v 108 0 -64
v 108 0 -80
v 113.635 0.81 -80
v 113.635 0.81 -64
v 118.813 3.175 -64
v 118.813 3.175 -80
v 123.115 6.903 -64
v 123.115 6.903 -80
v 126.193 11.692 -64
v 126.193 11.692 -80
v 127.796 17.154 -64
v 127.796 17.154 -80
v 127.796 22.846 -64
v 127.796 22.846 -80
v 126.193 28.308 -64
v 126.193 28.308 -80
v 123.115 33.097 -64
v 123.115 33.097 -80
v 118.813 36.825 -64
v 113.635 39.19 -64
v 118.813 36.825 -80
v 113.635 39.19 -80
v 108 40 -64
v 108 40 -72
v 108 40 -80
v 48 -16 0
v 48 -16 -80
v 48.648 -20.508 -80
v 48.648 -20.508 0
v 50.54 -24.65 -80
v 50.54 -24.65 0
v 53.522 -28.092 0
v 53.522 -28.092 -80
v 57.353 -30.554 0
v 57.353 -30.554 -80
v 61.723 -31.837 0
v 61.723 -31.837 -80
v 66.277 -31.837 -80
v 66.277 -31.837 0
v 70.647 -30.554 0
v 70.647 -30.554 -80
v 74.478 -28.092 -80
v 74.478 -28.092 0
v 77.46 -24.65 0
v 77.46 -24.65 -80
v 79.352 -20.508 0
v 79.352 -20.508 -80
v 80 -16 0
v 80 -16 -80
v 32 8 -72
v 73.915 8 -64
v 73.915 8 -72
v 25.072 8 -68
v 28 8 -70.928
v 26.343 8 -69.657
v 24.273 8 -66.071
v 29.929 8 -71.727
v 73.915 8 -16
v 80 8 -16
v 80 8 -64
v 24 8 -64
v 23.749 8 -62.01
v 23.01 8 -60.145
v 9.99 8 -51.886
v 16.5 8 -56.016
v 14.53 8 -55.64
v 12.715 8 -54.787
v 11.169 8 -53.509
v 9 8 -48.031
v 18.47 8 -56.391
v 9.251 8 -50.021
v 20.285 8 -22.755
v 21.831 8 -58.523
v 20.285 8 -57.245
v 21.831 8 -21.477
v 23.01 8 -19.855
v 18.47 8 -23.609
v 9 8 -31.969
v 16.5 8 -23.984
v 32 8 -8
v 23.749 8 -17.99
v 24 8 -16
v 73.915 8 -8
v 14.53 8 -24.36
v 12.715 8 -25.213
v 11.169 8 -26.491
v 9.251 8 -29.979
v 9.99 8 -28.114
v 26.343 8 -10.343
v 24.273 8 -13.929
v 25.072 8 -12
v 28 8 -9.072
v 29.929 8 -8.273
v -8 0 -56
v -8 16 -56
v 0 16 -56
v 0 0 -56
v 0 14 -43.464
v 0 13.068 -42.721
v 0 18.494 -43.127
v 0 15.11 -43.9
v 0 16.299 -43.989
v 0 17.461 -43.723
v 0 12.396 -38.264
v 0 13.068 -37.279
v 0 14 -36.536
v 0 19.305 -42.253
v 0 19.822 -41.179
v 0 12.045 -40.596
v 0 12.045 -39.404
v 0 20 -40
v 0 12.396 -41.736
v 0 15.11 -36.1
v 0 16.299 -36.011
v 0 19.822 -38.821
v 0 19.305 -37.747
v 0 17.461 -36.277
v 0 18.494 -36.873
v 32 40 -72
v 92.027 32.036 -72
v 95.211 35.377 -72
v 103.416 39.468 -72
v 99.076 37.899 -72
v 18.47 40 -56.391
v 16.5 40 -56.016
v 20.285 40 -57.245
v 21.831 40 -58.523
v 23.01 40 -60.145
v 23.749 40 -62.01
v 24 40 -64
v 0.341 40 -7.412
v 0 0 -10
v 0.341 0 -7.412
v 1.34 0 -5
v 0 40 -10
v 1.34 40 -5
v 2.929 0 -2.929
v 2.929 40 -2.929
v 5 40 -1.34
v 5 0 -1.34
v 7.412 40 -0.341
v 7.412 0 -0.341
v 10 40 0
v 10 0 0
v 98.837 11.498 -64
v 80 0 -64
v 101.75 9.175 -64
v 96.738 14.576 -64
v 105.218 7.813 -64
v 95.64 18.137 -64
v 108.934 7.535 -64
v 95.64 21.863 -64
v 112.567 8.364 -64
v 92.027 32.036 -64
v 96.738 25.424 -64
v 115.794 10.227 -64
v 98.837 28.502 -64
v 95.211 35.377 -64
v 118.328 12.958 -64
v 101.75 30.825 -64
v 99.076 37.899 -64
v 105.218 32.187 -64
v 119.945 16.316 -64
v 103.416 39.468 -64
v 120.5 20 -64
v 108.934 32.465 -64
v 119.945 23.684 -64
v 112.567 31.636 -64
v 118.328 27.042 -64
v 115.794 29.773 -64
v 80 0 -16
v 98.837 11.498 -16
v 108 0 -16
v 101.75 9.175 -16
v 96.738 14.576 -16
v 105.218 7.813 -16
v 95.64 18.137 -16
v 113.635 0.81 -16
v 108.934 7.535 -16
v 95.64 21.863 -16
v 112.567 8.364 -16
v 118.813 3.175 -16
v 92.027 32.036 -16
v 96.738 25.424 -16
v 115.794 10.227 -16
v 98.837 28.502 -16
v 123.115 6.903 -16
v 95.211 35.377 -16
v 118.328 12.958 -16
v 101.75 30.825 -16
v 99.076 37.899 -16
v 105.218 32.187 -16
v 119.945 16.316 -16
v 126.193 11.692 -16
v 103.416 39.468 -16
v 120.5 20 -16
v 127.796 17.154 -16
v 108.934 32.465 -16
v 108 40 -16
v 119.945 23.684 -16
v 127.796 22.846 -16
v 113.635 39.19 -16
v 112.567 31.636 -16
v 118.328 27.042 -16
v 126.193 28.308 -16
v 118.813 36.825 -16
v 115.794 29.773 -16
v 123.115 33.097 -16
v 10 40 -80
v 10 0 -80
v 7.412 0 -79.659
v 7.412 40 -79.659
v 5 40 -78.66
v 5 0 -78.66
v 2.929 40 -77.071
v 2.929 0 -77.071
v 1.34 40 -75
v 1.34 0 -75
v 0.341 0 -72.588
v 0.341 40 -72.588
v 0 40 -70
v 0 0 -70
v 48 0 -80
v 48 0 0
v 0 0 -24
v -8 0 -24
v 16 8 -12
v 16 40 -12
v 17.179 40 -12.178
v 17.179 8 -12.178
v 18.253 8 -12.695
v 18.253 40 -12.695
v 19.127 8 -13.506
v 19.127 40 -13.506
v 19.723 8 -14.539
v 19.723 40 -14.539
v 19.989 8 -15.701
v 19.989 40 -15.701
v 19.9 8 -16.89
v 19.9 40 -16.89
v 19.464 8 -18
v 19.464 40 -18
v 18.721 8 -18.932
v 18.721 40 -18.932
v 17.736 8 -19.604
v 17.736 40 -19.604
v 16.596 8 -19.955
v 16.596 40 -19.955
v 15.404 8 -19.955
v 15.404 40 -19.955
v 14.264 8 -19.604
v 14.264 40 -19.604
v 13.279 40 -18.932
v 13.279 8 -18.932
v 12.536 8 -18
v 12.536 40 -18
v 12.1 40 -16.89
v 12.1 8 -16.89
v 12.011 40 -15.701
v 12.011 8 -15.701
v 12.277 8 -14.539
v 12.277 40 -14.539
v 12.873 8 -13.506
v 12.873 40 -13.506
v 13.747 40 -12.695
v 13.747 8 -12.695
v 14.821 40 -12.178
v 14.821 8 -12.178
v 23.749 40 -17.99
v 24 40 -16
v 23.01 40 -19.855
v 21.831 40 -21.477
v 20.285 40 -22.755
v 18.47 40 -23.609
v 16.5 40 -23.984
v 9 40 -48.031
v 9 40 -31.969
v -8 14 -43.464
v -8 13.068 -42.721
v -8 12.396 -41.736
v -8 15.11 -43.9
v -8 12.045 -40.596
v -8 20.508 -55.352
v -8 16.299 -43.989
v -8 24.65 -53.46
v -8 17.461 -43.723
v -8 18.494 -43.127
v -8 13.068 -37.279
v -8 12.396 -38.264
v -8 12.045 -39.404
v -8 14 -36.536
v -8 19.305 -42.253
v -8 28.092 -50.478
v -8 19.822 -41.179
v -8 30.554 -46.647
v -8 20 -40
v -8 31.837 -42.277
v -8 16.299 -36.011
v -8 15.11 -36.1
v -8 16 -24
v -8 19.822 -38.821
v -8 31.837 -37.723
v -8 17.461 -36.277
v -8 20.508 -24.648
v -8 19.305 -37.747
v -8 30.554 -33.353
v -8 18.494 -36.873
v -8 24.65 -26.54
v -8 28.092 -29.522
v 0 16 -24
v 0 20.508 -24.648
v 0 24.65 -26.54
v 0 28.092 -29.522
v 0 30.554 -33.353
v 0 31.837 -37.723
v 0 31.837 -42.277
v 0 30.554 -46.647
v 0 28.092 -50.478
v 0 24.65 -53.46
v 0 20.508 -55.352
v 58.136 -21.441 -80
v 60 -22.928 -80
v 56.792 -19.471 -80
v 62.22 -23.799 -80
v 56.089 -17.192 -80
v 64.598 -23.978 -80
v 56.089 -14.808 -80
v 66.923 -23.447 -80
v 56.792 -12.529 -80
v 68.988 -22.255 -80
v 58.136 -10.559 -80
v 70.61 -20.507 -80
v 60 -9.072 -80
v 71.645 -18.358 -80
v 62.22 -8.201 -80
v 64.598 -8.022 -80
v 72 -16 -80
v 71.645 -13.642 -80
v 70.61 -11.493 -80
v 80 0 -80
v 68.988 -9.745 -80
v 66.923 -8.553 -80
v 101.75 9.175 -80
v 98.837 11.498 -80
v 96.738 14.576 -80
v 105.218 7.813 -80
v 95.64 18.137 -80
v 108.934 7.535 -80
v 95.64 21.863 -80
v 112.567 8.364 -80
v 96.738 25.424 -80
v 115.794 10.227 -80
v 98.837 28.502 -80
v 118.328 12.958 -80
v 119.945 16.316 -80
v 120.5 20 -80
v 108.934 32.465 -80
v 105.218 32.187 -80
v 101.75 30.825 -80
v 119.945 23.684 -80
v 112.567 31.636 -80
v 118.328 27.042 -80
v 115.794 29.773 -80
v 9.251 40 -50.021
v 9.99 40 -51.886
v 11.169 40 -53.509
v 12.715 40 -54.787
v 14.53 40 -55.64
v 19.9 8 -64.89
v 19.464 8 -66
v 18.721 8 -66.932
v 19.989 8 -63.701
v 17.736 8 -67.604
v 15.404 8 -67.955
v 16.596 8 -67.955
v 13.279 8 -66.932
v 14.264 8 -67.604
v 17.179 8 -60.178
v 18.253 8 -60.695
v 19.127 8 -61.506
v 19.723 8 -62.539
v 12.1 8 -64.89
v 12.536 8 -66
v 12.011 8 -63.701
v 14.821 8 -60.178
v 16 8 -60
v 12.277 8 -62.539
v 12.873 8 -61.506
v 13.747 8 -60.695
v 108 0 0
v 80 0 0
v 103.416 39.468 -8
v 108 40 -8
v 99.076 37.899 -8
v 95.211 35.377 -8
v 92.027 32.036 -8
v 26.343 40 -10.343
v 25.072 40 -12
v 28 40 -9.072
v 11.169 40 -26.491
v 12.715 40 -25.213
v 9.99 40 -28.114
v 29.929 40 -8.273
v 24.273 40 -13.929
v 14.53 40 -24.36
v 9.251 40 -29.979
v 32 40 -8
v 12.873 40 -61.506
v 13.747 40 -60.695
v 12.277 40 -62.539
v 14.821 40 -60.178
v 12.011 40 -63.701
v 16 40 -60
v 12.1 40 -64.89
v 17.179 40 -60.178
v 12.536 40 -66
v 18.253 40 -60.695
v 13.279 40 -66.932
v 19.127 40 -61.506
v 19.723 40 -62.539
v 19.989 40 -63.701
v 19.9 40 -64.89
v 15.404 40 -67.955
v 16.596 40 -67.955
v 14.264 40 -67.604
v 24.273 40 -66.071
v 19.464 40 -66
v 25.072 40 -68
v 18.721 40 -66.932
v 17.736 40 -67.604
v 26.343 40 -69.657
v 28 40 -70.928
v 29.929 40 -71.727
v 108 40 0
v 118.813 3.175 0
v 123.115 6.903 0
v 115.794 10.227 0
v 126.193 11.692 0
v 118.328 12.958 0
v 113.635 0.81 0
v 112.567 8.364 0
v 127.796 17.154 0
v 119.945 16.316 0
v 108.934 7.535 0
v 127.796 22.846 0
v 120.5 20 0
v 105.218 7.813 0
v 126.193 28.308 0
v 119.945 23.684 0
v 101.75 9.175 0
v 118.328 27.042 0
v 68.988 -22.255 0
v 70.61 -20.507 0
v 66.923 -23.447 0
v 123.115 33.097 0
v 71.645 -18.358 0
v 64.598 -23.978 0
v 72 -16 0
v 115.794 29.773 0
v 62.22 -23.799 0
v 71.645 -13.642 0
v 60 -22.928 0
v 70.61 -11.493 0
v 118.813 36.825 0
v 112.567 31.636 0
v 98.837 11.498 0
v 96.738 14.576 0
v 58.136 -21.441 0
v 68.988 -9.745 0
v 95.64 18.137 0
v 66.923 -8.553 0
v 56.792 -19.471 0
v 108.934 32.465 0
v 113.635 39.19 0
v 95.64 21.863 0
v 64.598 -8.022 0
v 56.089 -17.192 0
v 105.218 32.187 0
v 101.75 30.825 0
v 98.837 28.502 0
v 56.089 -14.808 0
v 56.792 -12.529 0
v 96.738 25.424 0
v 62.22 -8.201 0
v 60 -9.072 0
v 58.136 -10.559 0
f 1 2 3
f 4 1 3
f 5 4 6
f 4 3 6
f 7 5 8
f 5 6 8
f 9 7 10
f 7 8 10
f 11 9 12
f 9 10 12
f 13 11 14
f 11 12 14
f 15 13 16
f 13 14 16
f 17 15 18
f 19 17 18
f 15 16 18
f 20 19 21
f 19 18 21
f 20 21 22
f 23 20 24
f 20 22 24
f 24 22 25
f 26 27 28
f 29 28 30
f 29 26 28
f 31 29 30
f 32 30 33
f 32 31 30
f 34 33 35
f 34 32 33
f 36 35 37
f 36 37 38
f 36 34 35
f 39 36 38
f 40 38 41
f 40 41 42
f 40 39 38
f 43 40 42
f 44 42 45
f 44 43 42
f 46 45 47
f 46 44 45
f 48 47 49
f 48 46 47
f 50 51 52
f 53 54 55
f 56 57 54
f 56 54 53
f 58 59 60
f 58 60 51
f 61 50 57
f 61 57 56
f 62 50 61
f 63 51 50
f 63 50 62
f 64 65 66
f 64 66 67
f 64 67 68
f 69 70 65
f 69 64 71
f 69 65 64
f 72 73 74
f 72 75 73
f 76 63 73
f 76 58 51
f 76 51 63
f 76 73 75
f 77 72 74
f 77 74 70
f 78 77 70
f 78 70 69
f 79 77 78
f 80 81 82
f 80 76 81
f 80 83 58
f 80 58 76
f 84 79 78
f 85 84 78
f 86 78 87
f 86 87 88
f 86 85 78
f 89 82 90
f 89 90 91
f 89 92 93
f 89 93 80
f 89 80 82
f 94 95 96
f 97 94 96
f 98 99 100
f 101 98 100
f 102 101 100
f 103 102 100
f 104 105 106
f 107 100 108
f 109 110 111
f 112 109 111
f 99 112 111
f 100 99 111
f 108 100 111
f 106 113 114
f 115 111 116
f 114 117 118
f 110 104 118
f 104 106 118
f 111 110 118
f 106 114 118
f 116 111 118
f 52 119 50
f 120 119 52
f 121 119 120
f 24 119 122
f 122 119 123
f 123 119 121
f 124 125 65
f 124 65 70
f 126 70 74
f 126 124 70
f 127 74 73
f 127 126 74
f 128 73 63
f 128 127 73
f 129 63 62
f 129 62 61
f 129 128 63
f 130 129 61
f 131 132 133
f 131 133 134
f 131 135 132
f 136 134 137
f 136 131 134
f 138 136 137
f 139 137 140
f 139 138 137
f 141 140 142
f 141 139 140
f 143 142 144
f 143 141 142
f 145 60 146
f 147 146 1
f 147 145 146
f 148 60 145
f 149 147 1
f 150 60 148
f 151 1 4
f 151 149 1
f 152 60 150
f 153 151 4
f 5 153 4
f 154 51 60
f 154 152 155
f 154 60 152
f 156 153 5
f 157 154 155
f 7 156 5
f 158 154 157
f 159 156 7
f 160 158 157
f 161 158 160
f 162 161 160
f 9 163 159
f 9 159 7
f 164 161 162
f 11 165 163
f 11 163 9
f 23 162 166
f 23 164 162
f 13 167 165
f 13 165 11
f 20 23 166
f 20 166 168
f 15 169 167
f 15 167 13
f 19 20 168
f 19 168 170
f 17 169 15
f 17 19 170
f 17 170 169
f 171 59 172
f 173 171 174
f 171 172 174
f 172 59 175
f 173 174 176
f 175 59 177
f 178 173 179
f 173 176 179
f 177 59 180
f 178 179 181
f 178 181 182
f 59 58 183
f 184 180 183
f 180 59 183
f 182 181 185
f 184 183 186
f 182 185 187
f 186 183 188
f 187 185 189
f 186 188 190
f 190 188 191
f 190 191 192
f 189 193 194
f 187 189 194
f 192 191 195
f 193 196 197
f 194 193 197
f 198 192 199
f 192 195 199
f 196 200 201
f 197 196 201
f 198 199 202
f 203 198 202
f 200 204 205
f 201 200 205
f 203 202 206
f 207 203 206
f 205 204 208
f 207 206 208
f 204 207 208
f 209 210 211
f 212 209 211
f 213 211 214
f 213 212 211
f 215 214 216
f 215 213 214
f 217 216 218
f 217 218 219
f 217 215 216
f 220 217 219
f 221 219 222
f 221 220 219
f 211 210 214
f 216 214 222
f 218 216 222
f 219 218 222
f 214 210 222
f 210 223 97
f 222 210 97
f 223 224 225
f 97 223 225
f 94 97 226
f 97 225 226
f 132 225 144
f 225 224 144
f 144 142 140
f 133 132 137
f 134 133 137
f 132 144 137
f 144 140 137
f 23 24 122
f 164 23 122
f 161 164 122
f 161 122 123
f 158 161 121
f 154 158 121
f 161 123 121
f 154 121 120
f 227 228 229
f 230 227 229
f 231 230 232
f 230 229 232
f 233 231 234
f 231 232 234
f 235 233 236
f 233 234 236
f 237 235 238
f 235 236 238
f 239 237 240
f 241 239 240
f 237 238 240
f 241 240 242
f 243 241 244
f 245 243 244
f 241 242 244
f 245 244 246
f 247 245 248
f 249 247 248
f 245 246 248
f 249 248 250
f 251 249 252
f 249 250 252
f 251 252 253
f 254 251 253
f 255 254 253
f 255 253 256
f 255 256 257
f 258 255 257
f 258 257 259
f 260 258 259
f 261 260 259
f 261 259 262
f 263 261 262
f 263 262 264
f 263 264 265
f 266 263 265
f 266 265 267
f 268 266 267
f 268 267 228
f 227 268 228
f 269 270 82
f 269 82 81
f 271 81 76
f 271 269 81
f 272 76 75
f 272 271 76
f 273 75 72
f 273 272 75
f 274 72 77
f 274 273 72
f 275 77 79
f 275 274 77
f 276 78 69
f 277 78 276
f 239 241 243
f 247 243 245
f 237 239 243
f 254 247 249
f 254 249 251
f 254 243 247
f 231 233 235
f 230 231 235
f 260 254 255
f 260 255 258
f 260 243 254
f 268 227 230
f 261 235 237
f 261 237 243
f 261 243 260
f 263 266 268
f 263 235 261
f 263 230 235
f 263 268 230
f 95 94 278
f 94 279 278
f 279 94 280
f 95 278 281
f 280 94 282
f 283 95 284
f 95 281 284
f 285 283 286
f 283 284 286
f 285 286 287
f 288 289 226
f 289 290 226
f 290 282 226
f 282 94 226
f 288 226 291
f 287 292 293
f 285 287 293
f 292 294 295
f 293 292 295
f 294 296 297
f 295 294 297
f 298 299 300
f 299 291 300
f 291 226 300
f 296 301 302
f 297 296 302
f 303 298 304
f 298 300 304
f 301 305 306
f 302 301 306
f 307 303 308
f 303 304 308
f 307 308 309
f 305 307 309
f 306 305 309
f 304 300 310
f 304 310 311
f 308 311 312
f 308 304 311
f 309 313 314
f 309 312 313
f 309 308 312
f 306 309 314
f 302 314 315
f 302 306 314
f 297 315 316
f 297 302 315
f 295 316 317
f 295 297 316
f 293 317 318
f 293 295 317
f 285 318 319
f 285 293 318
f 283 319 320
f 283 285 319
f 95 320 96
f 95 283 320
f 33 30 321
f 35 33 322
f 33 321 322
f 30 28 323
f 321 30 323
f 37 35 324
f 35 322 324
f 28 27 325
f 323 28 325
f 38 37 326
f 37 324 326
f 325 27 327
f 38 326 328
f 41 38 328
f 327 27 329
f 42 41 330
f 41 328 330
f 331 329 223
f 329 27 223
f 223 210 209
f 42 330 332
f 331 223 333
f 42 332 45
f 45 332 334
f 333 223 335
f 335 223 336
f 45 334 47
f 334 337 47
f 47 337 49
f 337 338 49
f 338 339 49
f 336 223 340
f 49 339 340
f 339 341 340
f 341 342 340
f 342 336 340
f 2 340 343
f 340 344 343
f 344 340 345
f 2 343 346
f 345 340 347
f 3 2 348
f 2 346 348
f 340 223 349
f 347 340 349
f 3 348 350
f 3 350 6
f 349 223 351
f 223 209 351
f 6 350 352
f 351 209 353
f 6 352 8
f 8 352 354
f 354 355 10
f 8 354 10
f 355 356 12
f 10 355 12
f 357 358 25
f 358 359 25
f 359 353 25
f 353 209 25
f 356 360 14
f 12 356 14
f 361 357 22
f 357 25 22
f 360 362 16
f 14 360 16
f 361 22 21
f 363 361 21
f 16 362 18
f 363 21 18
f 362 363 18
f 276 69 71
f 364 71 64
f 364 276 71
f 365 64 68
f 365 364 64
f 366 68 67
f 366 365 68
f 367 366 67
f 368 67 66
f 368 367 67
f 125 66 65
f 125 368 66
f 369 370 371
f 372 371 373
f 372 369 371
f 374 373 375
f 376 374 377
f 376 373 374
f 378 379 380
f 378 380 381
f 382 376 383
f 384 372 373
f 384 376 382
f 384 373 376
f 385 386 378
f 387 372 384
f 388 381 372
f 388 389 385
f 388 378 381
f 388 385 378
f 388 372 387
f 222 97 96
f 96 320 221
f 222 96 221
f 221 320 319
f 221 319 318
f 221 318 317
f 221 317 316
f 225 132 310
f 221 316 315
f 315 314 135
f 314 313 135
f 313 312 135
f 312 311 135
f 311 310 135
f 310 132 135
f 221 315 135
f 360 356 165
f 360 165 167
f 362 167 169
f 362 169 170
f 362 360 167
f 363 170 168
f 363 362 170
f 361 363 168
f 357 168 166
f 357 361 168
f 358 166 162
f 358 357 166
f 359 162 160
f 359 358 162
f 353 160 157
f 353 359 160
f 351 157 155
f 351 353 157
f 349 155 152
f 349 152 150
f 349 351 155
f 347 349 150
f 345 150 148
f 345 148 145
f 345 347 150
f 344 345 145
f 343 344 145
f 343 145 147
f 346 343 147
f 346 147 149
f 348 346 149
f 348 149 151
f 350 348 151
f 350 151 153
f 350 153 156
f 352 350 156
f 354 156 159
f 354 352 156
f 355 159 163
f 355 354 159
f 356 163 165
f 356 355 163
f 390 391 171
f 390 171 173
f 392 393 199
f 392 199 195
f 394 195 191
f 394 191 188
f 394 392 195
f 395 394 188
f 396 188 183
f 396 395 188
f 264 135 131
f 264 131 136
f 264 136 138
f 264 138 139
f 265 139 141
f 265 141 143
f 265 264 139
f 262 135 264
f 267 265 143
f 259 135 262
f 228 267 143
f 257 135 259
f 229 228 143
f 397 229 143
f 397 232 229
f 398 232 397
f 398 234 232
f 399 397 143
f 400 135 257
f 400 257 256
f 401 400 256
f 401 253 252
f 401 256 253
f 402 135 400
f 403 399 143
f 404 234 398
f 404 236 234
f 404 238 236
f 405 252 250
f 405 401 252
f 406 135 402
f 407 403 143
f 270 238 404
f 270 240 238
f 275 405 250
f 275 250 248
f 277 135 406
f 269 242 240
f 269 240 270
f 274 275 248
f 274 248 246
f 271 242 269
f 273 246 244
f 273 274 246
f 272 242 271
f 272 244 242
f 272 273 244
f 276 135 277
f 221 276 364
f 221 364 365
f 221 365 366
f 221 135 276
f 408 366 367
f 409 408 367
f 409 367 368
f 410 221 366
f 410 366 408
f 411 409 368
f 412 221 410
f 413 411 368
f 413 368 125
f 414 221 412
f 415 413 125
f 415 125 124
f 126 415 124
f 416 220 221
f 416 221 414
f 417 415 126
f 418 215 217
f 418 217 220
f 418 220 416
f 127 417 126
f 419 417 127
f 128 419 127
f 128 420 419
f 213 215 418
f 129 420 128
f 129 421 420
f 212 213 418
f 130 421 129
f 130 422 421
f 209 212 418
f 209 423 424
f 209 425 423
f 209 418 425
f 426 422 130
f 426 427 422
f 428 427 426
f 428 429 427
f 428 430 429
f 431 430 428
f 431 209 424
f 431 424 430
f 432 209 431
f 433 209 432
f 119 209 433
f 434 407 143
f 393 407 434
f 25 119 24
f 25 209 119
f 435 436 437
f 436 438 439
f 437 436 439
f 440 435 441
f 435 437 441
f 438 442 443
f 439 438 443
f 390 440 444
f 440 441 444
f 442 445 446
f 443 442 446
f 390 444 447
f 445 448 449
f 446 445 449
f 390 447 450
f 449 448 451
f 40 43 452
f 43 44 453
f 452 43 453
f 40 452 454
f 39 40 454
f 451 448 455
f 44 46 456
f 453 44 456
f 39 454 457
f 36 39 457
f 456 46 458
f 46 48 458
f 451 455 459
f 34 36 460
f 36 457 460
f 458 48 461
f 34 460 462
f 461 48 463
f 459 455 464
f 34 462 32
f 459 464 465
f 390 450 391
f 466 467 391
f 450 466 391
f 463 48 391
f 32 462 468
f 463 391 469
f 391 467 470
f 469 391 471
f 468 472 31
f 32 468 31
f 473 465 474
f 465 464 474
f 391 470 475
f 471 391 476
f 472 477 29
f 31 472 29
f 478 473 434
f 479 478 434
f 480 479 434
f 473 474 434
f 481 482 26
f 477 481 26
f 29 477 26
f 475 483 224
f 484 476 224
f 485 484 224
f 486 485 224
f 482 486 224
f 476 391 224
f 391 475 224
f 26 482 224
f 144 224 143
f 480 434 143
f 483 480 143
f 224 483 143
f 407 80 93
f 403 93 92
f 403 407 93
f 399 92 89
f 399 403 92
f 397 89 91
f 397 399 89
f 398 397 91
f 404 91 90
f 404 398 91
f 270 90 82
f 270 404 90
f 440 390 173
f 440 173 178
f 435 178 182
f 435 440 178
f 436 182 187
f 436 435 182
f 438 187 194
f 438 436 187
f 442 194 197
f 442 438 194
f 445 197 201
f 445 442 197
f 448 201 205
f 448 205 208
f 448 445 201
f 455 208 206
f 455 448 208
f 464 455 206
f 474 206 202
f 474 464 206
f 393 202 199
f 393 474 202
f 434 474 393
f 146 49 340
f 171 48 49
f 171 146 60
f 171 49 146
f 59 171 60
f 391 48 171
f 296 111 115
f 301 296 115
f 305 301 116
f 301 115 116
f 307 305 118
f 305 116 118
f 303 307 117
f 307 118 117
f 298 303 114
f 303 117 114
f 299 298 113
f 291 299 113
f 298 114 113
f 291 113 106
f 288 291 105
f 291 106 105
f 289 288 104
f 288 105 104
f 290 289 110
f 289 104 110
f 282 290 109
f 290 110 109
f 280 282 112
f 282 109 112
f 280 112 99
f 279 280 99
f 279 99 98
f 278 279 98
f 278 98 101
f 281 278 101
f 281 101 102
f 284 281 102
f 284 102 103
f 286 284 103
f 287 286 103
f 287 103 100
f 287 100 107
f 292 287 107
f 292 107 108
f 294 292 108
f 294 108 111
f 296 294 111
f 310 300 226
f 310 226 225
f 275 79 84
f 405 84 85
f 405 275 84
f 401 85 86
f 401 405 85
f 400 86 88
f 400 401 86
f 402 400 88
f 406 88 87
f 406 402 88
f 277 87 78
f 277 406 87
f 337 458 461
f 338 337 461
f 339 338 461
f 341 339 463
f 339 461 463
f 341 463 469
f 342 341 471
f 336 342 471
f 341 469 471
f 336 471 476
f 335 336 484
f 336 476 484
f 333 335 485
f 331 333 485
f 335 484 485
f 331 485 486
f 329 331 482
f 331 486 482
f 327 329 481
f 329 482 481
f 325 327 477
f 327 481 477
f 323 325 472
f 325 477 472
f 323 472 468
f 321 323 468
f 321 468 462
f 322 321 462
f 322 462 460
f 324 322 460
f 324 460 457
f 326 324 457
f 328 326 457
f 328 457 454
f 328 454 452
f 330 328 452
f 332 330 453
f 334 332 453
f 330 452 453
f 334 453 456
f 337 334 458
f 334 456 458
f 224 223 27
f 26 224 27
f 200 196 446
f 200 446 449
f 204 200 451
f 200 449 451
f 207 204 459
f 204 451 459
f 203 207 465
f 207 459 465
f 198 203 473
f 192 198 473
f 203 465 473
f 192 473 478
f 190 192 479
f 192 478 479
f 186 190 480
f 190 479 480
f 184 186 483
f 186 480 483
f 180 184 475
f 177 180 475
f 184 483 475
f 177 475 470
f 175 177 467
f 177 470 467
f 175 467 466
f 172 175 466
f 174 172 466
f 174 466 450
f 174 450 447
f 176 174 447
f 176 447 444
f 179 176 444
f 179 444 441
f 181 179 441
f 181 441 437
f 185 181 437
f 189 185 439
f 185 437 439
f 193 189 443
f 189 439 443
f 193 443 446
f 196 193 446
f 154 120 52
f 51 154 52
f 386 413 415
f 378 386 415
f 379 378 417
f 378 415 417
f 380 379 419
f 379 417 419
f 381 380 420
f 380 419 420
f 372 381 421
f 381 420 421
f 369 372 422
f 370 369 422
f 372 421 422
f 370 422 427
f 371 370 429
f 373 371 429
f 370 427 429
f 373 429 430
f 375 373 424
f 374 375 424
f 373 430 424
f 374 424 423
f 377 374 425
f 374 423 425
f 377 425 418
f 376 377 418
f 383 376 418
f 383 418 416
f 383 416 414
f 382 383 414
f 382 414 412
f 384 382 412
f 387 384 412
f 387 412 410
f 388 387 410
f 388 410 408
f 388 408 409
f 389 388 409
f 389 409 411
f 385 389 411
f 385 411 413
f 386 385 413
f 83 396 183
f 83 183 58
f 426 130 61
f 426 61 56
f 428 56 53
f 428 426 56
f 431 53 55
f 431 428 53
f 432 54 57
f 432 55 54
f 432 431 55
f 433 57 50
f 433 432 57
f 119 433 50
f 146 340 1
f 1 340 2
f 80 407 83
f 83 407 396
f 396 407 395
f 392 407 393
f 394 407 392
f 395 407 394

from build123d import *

# Parameters (mm, degrees)
SKETCH1_R                 = 12.5
BOSS_EXTRUDE1_DEPTH       = 16
BOSS_EXTRUDE2_DEPTH       = 8
SKETCH1_6_R               = 8
BOSS_EXTRUDE3_DEPTH       = 80
BOSS_EXTRUDE4_START       = -24
SKETCH1_7_W               = 8
SKETCH1_7_H               = 32
BOSS_EXTRUDE4_DEPTH       = 32
FILLET1_RADIUS            = 16
FILLET1_LENGTH            = 8
F_8_0MM_DOWEL_HOLE1_D     = 8
F_8_0MM_DOWEL_HOLE1_DEPTH = 8
BOSS_EXTRUDE5_REACH       = 169.236
SKETCH3_R                 = 4
FILLET2_R                 = 10


with BuildPart() as part:
    # Sketch1 → Boss-Extrude1 (new body)
    with BuildSketch(Plane.XY):
        with BuildLine():
            Line((80, 8), (80, 0))
            Line((80, 0), (108, 0))
            ThreePointArc((108, 0), (128, 20), (108, 40))
            ThreePointArc((108, 40), (99.076043738, 37.898687232), (92.027289799, 32.036300463))
            Line((92.027289799, 32.036300463), (73.914638236, 8))
            Line((73.914638236, 8), (80, 8))
        make_face()
        with Locations((108, 20)):
            Circle(SKETCH1_R, mode=Mode.SUBTRACT)
    boss_extrude1 = extrude(amount=-BOSS_EXTRUDE1_DEPTH)

    # Sketch1<5> → Boss-Extrude2 (add)
    with BuildSketch(Plane.XY):
        with BuildLine():
            Line((9, 40), (9, 8))
            Line((9, 8), (73.914638236, 8))
            Line((73.914638236, 8), (92.027289799, 32.036300463))
            ThreePointArc((92.027289799, 32.036300463), (99.076043738, 37.898687232), (108, 40))
            Line((108, 40), (9, 40))
        make_face()
    boss_extrude2 = extrude(amount=-BOSS_EXTRUDE2_DEPTH)

    # Sketch1<6> → Boss-Extrude3 (add)
    # profile 1 of 3: a face of its own
    with BuildSketch(Plane.XY):
        Polygon((9, 8), (9, 0), (0, 0), (0, 40), (9, 40), align=None)
    # profile 2 of 3: a face of its own
    with BuildSketch(Plane.XY):
        Polygon((9, 8), (9, 0), (48, 0), (80, 0), (80, 8), (73.914638236, 8), align=None)
    # profile 3 of 3: a face of its own
    with BuildSketch(Plane.XY):
        with BuildLine():
            Line((80, 0), (48, 0))
            Line((48, 0), (48, -16))
            ThreePointArc((48, -16), (64, -32), (80, -16))
            Line((80, -16), (80, 0))
        make_face()
        with Locations((64, -16)):
            Circle(SKETCH1_6_R, mode=Mode.SUBTRACT)
    extrude(amount=-BOSS_EXTRUDE3_DEPTH)

    # Mirror1: Boss-Extrude1, Boss-Extrude2 across plane
    add(boss_extrude1.mirror(Plane.XY.offset(-40)))
    add(boss_extrude2.mirror(Plane.XY.offset(-40)))

    # Sketch1<7> → Boss-Extrude4 (add)
    with BuildSketch(Plane.XY.offset(BOSS_EXTRUDE4_START)):
        with Locations((-4, 16)):
            Rectangle(SKETCH1_7_W, SKETCH1_7_H)
    extrude(amount=-BOSS_EXTRUDE4_DEPTH)

    # Fillet1: full round fillet: the end face becomes a half cylinder, R = half its width
    fillet1_face = Plane((-4, 32, -40), x_dir=(-1, 0, 0), z_dir=(0, 1, 0))  # on the end face: x along it, z out of the body
    fillet1_slab = fillet1_face.offset(-FILLET1_RADIUS / 2) * Box(FILLET1_LENGTH, 2 * FILLET1_RADIUS, FILLET1_RADIUS, mode=Mode.PRIVATE)  # the body's end, R deep
    fillet1_round = Plane((-4, 16, -40), x_dir=(0, 1, 0), z_dir=(-1, 0, 0)) * Cylinder(FILLET1_RADIUS, FILLET1_LENGTH, mode=Mode.PRIVATE)  # its axis R under the face
    add(fillet1_slab - fillet1_round, mode=Mode.SUBTRACT)

    # Ø8.0mm Dowel Hole1
    with Locations(Plane(origin=(-8, 16, -40), x_dir=(0, -1, 0), z_dir=(-1, 0, 0))):
        with Locations((0, 0)):
            Hole(F_8_0MM_DOWEL_HOLE1_D / 2, depth=F_8_0MM_DOWEL_HOLE1_DEPTH)

    # Sketch3 → Boss-Extrude5 (add, up to next)
    with BuildSketch(Plane(origin=(0, 40, 0), x_dir=(1, 0, 0), z_dir=(0, 1, 0)), mode=Mode.PRIVATE) as boss_extrude5_sk1:
        with BuildLine():
            Line((32, 72), (9, 72))
            Line((9, 72), (9, 48.031280577))
            ThreePointArc((9, 48.031280577), (11.169048105, 53.508506152), (16.5, 56.015640289))
            ThreePointArc((16.5, 56.015640289), (21.830951895, 58.522774425), (24, 64))
            ThreePointArc((24, 64), (26.343145751, 69.656854249), (32, 72))
        make_face()
        with Locations(Location((16, 64, 0), (0, 0, 270))):
            Circle(SKETCH3_R, mode=Mode.SUBTRACT)
    boss_extrude5_tool1 = extrude(boss_extrude5_sk1.sketch, amount=-BOSS_EXTRUDE5_REACH, mode=Mode.PRIVATE) - part.part
    # Sketch3 → Boss-Extrude5 (add, up to next)
    with BuildSketch(Plane(origin=(0, 40, 0), x_dir=(1, 0, 0), z_dir=(0, 1, 0)), mode=Mode.PRIVATE) as boss_extrude5_sk2:
        with BuildLine():
            ThreePointArc((16.5, 23.984359711), (11.169048105, 26.491493848), (9, 31.968719423))
            Line((9, 31.968719423), (9, 8))
            Line((9, 8), (32, 8))
            ThreePointArc((32, 8), (26.343145751, 10.343145751), (24, 16))
            ThreePointArc((24, 16), (21.830951895, 21.477225575), (16.5, 23.984359711))
        make_face()
        with Locations(Location((16, 16, 0), (0, 0, 270))):
            Circle(SKETCH3_R, mode=Mode.SUBTRACT)
    boss_extrude5_tool2 = extrude(boss_extrude5_sk2.sketch, amount=-BOSS_EXTRUDE5_REACH, mode=Mode.PRIVATE) - part.part
    add(boss_extrude5_tool1.solids().sort_by_distance((20.5, 40, -71.66781))[0])
    add(boss_extrude5_tool2.solids().sort_by_distance((10.926925, 40, -26.264059))[0])

    # Fillet2
    fillet2_edges = [part.edges().sort_by_distance(p)[0] for p in [
        (0, 20, 0),
        (0, 20, -80),
    ]]
    fillet(fillet2_edges, radius=FILLET2_R)


solid = part.part
